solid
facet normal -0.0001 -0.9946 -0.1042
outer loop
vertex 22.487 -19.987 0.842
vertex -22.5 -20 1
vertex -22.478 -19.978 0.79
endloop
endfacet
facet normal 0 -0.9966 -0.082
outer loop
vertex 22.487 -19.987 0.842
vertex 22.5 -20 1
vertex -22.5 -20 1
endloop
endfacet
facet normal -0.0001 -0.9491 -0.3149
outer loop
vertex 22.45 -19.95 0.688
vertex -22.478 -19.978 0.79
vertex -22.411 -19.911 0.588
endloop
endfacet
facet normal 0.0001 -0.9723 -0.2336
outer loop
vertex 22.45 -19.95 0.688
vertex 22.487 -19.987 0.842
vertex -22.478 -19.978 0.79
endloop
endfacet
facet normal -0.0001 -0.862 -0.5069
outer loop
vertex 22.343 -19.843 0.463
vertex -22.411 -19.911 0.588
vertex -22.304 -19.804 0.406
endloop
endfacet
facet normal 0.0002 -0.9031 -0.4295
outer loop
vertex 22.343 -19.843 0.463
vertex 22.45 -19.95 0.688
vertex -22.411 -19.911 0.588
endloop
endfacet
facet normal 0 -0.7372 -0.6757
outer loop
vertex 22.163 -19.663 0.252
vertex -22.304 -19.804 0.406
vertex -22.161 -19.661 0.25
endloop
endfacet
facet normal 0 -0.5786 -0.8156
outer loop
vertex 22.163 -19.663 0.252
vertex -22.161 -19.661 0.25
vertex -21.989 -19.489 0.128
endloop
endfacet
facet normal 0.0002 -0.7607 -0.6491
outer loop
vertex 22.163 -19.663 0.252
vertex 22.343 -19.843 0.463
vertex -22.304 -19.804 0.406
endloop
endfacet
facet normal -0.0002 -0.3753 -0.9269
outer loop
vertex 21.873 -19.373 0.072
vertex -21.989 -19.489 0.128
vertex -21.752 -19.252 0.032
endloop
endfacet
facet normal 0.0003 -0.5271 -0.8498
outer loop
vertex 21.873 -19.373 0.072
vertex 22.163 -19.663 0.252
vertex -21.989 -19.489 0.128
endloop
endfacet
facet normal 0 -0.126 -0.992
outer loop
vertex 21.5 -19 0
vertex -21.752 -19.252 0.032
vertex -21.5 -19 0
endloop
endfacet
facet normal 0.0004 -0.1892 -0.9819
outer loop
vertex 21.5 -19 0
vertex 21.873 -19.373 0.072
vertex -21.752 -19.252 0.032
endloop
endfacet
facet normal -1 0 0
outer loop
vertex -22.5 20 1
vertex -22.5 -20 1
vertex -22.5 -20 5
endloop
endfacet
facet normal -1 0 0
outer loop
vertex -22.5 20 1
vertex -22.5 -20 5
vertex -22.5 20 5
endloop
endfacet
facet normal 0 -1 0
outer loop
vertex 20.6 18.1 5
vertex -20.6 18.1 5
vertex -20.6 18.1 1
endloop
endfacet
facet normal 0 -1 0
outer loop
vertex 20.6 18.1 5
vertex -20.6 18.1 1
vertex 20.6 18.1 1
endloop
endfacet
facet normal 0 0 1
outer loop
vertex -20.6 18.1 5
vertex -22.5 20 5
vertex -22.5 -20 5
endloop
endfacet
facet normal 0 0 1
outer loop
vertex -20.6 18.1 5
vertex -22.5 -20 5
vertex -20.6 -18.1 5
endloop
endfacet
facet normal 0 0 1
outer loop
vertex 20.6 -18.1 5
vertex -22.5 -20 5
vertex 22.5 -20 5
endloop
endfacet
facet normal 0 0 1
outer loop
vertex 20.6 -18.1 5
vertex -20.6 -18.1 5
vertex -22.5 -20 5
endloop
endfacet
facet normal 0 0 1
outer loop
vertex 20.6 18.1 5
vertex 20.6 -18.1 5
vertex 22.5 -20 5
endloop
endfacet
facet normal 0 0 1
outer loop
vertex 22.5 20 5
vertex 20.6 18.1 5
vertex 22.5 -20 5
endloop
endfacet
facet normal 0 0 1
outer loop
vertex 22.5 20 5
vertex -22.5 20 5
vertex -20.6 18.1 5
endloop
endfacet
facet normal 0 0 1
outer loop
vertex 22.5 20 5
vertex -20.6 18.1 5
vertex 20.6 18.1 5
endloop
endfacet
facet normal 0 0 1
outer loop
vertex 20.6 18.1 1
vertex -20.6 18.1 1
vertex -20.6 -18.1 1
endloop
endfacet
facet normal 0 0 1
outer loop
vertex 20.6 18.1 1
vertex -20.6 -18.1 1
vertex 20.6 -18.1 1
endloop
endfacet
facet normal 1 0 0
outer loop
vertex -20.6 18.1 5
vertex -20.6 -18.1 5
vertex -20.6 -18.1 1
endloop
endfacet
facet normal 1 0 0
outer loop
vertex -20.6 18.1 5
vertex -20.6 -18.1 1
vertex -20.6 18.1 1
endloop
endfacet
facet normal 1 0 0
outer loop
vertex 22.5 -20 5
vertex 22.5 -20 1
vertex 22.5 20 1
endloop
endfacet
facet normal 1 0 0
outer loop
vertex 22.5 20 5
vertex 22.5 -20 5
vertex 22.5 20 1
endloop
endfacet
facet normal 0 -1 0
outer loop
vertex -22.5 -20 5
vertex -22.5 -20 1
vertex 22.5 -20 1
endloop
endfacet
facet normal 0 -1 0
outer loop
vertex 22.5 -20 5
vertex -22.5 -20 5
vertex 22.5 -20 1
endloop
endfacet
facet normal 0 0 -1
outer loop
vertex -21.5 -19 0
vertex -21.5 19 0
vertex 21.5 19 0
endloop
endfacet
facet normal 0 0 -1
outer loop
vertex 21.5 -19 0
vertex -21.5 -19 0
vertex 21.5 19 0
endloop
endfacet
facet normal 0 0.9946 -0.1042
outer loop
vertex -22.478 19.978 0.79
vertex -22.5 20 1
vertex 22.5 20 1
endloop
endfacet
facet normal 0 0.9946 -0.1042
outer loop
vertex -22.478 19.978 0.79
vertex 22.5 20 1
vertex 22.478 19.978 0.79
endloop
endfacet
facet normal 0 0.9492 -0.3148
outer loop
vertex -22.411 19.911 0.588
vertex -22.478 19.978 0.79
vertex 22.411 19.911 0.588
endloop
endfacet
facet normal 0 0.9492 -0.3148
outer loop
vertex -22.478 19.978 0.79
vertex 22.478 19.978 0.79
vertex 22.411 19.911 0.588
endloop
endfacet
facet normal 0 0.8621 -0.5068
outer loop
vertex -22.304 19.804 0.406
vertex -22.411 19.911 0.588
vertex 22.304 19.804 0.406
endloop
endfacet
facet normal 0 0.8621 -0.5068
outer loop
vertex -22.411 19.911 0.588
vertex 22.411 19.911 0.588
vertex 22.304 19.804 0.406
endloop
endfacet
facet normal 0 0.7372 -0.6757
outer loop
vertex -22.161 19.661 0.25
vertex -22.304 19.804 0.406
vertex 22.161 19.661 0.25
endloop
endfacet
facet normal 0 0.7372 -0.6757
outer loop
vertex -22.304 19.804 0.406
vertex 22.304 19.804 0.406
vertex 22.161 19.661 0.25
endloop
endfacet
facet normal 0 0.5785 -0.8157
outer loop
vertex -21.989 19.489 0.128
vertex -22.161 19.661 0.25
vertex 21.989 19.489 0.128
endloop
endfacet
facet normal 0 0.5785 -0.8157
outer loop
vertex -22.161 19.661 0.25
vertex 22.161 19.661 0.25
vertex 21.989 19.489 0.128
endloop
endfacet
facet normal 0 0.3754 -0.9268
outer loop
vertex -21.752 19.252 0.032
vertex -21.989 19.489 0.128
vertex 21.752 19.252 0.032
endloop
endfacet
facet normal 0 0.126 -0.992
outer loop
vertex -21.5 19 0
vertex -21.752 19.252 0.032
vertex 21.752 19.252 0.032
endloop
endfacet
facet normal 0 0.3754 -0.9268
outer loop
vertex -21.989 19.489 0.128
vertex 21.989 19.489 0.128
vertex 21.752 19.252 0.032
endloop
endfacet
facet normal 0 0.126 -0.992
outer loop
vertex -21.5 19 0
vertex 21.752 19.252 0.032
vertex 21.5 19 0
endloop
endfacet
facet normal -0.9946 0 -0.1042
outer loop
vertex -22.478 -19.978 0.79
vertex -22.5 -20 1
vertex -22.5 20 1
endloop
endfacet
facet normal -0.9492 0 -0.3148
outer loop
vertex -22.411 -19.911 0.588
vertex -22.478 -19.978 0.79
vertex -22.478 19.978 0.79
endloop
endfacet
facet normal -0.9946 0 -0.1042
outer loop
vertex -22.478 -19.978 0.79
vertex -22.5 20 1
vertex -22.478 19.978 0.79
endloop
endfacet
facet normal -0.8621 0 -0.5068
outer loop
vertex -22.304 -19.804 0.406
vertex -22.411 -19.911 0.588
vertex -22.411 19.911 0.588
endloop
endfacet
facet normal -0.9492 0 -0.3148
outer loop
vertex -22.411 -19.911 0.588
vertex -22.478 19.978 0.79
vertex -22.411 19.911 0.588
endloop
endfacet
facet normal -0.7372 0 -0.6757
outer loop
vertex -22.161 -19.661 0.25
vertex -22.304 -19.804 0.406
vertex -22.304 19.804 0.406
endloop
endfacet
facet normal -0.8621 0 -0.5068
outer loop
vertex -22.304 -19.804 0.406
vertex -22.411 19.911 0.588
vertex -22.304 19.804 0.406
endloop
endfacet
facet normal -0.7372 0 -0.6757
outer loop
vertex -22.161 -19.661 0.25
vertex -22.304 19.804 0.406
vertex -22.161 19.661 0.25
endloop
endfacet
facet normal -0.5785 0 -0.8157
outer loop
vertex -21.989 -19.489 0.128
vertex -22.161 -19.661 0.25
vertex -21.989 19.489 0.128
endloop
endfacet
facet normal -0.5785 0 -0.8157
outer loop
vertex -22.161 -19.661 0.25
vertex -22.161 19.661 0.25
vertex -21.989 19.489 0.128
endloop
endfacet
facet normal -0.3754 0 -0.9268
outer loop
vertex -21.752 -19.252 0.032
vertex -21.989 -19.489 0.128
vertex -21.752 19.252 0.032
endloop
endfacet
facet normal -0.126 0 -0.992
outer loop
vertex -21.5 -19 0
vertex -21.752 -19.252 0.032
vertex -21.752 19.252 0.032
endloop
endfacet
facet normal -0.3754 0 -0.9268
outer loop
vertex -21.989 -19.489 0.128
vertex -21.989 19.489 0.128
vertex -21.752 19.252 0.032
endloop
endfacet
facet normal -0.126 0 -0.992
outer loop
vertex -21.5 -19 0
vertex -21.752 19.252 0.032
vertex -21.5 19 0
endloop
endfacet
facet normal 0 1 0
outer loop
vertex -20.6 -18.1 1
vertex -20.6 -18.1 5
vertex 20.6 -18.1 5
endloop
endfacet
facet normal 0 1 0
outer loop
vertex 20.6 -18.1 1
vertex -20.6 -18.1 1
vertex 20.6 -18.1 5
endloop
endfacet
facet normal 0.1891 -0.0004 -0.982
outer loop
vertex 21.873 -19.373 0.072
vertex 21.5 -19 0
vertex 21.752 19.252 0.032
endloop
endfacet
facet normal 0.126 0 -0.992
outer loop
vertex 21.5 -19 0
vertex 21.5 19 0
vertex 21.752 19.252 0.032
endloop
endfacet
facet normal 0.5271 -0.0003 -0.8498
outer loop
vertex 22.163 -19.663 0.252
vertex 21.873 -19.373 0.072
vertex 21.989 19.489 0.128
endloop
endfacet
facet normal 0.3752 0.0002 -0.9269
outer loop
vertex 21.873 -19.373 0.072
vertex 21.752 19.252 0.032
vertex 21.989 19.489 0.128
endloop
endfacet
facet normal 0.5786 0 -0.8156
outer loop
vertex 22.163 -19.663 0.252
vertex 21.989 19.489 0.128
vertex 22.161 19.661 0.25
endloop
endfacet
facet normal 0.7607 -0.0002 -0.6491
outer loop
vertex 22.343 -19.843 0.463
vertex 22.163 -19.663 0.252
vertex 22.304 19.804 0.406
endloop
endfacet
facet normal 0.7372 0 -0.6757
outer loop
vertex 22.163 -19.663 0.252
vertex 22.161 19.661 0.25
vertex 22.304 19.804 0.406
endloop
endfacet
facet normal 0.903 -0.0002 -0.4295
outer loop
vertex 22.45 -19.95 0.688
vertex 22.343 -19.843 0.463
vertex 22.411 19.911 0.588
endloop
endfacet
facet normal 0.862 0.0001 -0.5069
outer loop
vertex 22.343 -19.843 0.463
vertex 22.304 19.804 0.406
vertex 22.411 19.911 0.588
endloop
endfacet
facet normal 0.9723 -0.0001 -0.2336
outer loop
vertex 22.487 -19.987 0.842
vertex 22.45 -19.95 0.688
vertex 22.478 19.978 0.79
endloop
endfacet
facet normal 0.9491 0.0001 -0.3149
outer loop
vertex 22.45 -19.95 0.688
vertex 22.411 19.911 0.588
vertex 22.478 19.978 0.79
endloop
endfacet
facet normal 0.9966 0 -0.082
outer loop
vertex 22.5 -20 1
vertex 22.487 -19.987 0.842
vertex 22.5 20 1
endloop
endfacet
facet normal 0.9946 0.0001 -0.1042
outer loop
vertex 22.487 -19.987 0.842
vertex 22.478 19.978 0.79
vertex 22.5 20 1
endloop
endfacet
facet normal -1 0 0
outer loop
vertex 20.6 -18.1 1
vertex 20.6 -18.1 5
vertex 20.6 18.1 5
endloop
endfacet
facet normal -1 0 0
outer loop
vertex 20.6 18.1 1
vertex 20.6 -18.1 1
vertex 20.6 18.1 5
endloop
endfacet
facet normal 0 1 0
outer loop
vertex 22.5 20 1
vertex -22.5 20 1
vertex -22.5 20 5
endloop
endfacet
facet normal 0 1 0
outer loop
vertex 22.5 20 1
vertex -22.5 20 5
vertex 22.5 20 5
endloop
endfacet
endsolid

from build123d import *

# Parameters (mm, degrees)
SKETCH_W     = 45
SKETCH_H     = 40
PAD_DEPTH    = 5
SKETCH001_W  = 41.2
SKETCH001_H  = 36.2
POCKET_DEPTH = 4
FILLET_R     = 1


with BuildPart() as part:
    # Sketch → Pad (new body)
    with BuildSketch(Plane.XY):
        Rectangle(SKETCH_W, SKETCH_H)
    extrude(amount=PAD_DEPTH)

    # Sketch001 (on Face6 of Pad) → Pocket (cut)
    with BuildSketch(Plane.XY.offset(5)):
        Rectangle(SKETCH001_W, SKETCH001_H)
    extrude(amount=-POCKET_DEPTH, mode=Mode.SUBTRACT)

    # Fillet
    fillet_edges = [part.edges().sort_by_distance(p)[0] for p in [
        (0, 20, 0),
        (22.5, 0, 0),
        (0, -20, 0),
        (-22.5, 0, 0),
    ]]
    fillet(fillet_edges, radius=FILLET_R)


solid = part.part
